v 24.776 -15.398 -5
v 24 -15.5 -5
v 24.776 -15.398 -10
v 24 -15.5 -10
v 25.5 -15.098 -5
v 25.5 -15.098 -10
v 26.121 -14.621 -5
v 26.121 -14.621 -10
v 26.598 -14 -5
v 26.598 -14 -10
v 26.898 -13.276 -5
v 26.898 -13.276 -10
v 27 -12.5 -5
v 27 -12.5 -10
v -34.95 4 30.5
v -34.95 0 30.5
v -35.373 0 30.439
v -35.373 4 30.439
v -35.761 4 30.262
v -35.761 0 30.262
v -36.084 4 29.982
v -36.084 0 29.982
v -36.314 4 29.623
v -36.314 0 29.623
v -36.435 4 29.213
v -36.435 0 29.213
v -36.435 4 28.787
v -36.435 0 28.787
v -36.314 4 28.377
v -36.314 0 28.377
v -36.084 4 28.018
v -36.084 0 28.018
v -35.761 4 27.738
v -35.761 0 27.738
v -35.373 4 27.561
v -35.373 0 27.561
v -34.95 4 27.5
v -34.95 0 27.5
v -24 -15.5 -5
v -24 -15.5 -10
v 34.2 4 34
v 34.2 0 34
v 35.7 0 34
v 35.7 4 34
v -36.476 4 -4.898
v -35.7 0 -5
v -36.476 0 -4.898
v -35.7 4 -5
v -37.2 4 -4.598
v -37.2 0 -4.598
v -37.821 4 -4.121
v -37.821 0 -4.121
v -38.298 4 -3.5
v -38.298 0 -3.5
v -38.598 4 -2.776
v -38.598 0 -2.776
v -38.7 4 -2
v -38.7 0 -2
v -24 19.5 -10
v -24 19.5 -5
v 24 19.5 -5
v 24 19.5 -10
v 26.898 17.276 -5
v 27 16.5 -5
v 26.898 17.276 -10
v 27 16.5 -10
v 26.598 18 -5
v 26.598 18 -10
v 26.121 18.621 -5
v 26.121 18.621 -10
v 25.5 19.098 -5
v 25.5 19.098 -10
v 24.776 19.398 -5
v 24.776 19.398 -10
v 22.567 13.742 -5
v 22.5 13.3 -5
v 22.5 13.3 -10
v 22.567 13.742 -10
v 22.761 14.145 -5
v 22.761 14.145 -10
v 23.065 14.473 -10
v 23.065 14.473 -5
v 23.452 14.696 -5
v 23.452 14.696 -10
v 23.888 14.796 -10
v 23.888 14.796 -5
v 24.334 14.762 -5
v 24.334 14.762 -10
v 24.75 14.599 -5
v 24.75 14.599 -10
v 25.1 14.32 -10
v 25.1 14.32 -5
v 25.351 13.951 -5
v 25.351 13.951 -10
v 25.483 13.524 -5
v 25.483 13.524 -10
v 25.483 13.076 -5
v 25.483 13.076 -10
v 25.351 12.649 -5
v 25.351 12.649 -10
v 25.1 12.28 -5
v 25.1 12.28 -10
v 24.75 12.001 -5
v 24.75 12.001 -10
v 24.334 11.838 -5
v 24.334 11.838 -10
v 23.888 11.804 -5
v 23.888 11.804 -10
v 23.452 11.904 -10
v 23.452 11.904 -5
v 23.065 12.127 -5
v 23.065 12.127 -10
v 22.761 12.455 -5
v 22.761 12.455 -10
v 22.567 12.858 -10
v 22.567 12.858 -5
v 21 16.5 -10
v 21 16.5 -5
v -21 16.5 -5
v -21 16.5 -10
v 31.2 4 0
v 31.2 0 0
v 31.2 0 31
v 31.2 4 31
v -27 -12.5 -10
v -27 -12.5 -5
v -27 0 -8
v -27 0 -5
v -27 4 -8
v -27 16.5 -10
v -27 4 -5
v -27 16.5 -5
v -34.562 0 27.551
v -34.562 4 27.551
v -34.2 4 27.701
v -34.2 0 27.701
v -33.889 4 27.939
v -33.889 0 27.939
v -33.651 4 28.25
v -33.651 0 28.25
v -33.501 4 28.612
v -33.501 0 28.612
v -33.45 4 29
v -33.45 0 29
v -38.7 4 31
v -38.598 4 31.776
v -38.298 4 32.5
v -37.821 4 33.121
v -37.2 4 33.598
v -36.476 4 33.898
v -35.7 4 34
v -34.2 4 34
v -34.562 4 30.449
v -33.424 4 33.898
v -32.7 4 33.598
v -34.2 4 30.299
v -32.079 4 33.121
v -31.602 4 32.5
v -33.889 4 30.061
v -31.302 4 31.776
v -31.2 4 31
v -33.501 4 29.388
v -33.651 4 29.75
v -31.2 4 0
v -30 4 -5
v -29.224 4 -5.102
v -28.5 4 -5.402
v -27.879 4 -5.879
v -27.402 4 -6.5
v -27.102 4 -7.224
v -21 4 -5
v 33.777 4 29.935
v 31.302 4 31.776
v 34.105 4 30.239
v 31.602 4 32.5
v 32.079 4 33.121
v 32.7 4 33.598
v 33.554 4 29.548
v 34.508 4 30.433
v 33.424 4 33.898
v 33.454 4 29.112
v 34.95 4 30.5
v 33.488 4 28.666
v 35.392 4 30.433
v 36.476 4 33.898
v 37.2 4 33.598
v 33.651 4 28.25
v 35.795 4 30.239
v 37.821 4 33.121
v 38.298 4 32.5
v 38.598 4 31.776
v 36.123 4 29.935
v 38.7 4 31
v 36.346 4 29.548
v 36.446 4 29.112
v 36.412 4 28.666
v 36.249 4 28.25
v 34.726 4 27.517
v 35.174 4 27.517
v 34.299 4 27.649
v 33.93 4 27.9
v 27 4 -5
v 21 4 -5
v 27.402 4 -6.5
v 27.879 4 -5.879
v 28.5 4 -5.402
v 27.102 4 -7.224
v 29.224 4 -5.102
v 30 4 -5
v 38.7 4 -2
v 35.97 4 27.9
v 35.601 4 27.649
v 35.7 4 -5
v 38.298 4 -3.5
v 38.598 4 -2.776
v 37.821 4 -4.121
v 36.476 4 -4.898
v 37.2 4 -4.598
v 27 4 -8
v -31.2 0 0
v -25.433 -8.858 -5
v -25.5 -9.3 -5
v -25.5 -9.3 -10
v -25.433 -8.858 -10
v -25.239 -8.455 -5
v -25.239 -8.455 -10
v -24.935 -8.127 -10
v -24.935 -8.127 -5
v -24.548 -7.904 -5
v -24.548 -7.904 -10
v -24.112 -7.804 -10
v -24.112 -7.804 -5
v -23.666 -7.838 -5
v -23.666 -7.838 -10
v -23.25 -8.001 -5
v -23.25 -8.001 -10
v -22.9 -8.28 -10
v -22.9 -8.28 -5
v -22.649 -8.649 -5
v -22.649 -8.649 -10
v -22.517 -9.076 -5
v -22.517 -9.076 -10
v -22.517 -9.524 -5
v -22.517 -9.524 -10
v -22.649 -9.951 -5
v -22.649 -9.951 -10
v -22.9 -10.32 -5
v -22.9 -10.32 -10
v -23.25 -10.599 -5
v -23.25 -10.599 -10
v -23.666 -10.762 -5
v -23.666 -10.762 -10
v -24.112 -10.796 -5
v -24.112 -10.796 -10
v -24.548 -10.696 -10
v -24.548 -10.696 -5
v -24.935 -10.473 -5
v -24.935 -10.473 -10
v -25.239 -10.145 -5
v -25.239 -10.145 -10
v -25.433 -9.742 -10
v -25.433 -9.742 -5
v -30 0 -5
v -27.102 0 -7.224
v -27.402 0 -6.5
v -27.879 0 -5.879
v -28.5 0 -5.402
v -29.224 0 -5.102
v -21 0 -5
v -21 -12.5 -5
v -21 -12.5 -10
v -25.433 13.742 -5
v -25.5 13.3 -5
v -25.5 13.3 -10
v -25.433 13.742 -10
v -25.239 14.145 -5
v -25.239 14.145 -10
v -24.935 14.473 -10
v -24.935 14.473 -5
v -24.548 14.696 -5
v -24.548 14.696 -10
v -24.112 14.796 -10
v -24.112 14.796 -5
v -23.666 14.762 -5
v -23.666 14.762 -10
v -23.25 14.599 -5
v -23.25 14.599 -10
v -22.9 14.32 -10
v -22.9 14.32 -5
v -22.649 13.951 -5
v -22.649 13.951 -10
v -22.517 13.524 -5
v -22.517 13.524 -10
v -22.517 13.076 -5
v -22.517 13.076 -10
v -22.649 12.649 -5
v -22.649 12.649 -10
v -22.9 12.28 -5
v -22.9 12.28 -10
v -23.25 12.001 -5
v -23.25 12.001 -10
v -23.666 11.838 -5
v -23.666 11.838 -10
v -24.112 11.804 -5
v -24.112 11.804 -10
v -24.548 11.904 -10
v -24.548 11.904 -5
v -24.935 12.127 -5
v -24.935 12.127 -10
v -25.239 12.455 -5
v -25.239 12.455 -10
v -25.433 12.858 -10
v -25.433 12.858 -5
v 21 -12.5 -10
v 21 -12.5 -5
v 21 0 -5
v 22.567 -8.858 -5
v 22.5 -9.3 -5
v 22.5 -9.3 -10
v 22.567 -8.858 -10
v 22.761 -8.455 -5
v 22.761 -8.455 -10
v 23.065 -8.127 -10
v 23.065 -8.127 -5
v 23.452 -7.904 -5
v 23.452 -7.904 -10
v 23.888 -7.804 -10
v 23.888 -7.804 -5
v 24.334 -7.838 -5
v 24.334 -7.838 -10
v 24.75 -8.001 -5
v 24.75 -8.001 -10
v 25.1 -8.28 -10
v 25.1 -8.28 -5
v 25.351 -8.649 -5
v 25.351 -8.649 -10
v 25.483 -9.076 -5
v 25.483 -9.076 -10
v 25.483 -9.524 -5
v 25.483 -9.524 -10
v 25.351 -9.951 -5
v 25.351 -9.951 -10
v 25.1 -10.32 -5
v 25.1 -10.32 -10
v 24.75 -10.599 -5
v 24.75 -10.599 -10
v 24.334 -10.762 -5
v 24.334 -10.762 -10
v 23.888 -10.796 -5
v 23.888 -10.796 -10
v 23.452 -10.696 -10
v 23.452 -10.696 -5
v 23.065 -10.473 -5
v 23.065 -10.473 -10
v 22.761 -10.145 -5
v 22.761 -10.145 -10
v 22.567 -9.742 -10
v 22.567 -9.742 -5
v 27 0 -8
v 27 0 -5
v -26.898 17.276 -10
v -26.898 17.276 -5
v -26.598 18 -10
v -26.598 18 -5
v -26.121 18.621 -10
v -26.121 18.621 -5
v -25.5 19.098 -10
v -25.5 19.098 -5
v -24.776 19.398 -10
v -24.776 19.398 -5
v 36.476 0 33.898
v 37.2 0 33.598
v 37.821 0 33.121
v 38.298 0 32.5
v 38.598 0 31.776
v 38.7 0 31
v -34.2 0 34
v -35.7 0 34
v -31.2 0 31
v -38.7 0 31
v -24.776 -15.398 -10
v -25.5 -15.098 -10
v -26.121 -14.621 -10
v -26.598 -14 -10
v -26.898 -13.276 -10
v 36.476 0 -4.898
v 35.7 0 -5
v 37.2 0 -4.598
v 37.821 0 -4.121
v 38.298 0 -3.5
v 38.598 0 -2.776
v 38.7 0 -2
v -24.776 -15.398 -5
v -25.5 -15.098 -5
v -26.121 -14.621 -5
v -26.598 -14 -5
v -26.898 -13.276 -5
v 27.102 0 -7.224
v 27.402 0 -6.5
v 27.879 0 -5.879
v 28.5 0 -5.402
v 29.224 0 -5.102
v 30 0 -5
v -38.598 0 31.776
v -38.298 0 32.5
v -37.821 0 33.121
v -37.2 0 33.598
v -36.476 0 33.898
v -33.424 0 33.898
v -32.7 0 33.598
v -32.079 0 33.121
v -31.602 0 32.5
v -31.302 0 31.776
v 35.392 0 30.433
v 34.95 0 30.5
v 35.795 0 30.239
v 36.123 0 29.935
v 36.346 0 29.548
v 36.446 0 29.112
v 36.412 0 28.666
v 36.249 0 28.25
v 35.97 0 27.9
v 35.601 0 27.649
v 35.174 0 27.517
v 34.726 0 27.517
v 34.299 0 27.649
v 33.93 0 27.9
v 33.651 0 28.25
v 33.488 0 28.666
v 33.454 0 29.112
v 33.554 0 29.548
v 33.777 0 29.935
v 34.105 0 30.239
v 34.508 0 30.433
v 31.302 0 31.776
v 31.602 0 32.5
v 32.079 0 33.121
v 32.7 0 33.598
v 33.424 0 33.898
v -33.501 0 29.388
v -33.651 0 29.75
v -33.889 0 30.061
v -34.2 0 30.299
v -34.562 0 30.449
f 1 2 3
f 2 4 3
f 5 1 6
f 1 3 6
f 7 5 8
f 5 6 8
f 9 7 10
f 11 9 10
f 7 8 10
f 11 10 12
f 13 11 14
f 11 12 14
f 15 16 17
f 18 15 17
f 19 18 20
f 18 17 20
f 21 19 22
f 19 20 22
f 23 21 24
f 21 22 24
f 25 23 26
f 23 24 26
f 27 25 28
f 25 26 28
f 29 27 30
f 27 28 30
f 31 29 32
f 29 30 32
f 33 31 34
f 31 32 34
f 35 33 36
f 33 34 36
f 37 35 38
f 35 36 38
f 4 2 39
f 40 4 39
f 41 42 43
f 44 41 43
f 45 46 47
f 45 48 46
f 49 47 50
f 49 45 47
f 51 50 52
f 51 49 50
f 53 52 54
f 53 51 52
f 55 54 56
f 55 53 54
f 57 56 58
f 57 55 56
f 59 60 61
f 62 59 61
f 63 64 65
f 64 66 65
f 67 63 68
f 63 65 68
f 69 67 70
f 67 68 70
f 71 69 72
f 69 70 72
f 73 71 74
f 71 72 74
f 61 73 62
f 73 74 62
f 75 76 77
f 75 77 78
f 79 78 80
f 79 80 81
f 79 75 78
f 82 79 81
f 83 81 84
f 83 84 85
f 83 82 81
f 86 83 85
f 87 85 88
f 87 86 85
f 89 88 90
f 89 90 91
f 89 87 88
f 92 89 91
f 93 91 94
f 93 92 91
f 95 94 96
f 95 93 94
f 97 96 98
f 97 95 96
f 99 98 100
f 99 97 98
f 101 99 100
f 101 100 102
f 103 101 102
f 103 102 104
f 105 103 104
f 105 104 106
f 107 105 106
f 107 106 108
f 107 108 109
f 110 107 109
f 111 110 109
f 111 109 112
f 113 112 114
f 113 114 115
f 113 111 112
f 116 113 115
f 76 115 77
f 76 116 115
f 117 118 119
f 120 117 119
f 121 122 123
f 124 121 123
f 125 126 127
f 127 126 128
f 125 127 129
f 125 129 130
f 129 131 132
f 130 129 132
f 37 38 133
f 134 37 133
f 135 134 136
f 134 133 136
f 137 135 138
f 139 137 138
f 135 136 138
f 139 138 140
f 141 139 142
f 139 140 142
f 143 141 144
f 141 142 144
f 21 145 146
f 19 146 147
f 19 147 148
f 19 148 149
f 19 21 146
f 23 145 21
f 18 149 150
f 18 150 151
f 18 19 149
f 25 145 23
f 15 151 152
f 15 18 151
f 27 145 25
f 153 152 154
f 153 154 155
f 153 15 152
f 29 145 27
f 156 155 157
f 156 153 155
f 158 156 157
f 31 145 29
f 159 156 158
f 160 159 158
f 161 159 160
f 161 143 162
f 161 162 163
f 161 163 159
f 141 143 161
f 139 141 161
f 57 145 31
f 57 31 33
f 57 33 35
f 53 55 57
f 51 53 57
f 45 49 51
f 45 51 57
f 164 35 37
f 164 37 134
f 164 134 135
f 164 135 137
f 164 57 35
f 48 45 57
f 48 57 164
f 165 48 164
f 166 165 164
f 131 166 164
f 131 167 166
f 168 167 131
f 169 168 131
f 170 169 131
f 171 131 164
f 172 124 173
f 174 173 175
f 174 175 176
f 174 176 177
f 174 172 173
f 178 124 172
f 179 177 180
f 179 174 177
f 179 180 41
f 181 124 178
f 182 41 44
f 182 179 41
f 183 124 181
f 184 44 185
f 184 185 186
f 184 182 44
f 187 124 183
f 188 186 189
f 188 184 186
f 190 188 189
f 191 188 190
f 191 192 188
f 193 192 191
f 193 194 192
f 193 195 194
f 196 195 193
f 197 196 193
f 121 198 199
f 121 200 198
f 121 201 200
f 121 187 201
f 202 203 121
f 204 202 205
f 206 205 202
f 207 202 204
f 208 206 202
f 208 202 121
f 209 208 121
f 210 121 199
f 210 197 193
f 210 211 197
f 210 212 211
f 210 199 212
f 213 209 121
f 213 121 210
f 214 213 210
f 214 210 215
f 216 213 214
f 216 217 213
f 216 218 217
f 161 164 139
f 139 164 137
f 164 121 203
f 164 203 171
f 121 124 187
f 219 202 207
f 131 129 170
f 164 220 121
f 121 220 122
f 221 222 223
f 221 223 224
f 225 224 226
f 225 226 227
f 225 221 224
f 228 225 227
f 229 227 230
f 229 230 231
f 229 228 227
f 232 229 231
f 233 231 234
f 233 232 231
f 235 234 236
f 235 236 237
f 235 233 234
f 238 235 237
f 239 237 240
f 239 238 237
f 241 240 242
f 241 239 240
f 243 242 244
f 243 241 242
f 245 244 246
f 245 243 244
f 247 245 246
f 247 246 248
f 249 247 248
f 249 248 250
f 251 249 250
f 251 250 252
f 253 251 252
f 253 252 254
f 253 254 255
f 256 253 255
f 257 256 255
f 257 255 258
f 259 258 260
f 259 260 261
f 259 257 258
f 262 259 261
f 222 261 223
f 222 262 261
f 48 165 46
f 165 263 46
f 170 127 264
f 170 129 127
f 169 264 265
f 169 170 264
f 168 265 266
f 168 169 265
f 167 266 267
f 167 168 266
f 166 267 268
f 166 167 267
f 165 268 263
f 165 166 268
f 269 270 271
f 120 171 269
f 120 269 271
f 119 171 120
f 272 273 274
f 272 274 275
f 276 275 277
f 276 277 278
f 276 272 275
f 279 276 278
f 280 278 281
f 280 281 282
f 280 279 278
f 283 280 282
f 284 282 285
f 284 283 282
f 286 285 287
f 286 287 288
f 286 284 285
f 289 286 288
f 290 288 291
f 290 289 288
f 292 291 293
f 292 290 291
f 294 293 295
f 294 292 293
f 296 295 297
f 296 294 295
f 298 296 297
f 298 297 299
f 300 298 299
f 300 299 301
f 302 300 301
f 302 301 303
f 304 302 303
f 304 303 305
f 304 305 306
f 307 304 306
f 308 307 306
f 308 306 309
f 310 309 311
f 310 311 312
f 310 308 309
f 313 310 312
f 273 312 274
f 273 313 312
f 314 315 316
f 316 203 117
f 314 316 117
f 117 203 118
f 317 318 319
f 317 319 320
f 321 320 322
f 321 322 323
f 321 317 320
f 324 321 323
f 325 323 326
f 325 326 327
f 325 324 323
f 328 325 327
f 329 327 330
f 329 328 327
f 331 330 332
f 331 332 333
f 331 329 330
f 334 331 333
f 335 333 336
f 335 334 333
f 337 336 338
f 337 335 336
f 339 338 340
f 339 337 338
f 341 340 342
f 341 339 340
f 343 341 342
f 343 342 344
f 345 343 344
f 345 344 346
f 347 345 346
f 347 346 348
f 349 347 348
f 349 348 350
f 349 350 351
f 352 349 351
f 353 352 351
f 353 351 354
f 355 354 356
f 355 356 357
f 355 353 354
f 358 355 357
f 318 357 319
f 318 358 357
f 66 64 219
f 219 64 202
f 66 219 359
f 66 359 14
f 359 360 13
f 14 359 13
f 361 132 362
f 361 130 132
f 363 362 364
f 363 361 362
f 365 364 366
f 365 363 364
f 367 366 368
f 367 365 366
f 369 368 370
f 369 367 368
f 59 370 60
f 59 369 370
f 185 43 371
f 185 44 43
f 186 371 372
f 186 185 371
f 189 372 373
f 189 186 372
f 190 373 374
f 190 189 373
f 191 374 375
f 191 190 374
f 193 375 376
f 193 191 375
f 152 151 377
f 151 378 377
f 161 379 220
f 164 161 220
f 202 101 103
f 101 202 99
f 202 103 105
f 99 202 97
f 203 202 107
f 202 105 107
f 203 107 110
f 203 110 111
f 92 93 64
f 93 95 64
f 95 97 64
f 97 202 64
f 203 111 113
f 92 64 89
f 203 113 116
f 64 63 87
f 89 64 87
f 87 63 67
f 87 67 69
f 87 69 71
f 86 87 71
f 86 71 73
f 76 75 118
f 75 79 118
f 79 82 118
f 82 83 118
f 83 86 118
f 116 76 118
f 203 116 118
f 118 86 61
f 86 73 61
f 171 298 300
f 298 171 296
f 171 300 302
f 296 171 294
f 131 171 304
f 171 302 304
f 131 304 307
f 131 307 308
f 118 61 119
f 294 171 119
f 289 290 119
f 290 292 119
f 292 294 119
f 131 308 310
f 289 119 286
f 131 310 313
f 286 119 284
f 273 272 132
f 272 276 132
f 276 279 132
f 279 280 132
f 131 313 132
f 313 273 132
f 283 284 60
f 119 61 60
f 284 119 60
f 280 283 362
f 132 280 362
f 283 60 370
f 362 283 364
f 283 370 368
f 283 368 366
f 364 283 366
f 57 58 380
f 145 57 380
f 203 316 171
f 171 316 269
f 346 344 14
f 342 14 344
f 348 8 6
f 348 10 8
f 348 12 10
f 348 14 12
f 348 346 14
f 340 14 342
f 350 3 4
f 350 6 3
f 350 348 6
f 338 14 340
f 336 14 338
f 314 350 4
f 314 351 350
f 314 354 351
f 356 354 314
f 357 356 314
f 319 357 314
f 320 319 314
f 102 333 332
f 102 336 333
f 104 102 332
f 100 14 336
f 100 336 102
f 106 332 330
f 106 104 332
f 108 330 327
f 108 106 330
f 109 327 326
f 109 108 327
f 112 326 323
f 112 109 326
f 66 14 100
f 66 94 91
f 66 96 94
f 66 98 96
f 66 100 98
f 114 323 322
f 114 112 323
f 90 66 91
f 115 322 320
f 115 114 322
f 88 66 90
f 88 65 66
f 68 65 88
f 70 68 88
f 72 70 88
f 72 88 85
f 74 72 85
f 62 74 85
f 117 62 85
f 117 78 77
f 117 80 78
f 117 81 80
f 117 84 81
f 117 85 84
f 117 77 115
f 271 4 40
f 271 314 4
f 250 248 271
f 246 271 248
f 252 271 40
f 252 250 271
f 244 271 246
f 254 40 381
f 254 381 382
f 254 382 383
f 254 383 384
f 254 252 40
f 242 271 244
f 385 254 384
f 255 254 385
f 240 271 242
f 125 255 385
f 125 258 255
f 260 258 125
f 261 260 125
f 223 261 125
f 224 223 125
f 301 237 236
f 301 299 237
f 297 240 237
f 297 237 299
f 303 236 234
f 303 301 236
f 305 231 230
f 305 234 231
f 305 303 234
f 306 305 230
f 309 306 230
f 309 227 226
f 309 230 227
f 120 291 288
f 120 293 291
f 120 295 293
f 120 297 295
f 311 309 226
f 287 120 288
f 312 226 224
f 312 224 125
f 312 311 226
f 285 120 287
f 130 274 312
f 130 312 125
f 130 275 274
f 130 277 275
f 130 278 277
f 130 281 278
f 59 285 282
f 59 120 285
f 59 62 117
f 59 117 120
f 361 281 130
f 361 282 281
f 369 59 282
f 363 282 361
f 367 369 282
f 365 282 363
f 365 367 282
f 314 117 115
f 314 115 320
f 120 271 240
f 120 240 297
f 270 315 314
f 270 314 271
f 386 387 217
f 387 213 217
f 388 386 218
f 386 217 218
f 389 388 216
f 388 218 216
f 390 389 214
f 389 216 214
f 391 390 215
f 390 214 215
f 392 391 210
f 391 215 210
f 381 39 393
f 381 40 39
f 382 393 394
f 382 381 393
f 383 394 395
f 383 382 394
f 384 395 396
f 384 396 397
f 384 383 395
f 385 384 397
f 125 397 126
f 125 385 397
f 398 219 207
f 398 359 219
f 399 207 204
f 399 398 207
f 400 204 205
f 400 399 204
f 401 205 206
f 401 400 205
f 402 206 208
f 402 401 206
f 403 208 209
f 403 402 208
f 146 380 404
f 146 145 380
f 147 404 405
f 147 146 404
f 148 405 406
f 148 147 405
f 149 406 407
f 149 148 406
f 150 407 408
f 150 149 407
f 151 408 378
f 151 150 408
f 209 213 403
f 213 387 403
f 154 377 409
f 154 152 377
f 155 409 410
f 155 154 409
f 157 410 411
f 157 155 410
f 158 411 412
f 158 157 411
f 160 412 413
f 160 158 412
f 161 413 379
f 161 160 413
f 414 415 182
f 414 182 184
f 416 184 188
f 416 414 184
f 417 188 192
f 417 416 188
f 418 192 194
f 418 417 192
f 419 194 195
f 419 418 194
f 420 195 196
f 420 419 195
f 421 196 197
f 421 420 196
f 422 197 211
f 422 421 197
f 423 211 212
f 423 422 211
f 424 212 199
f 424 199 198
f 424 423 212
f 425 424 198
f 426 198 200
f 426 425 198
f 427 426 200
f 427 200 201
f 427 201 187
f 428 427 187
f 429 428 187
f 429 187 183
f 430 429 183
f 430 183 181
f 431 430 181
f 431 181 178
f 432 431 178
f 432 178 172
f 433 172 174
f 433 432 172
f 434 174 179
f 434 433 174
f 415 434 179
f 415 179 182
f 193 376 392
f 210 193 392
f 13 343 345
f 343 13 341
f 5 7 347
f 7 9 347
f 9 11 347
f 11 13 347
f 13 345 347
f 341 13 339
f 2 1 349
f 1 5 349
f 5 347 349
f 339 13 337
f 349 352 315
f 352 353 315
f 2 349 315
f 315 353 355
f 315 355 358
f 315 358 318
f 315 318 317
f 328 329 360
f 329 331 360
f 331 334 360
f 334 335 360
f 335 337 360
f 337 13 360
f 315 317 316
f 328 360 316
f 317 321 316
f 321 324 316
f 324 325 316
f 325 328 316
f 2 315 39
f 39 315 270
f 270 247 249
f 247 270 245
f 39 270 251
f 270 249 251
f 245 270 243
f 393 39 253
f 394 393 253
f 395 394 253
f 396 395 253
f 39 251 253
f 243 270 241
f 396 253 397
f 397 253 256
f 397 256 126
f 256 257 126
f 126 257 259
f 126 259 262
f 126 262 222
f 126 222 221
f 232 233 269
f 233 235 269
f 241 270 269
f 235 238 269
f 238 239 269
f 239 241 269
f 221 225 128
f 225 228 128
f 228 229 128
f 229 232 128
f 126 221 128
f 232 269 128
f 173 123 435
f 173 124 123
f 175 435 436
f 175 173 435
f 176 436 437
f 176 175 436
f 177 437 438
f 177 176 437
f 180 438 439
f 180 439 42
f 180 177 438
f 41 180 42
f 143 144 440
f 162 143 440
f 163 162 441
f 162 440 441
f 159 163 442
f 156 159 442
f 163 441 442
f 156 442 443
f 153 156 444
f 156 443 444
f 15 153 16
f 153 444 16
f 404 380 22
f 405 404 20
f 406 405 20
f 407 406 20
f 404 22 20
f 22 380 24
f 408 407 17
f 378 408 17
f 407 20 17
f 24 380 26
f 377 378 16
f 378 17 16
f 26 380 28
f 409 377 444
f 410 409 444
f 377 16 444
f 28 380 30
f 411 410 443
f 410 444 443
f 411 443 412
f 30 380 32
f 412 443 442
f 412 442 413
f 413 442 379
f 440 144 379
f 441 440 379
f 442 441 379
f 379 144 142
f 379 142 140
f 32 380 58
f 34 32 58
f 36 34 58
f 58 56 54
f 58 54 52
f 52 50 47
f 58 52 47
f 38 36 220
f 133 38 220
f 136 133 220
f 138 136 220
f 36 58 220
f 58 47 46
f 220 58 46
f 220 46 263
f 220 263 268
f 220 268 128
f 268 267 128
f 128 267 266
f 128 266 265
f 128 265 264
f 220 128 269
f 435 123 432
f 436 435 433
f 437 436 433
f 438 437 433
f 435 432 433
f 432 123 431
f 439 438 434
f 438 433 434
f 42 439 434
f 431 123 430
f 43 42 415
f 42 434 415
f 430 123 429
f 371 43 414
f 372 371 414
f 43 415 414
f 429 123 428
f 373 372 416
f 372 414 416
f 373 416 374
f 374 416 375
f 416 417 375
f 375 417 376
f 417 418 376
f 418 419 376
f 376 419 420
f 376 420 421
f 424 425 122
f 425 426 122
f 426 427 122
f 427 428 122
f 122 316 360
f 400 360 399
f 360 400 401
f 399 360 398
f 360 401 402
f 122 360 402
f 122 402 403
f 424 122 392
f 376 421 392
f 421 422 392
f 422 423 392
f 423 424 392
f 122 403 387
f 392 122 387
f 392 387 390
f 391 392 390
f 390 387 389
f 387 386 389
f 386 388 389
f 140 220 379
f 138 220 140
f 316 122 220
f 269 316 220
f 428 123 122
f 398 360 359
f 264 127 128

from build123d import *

# Parameters (mm, degrees)
SKETCH_1_R      = 1.5
EXTRUDE_1_DEPTH = 4
SKETCH_3_R      = 1.5
SKETCH_3_W      = 42
SKETCH_3_H      = 29
EXTRUDE_2_DEPTH = 5
FILLET_1_R      = 3
FILLET_2_R      = 3


with BuildPart() as part:
    # 草图1 → 凸台-拉伸1 (new body)
    # profile 1 of 3: a face of its own
    with BuildSketch(Plane(origin=(0, 0, 0), x_dir=(1, 0, 0), z_dir=(0, 1, 0))):
        Polygon((0, 0), (31.2, 0), (31.2, -34), (38.7, -34), (38.7, 5), (0, 5), align=None)
        with Locations(Location((34.95, -29, 0), (0, 0, 270))):
            Circle(SKETCH_1_R, mode=Mode.SUBTRACT)
    # profile 2 of 3: a face of its own
    with BuildSketch(Plane(origin=(0, 0, 0), x_dir=(1, 0, 0), z_dir=(0, 1, 0))):
        with BuildLine():
            Line((-31.2, 0), (0, 0))
            Line((0, 0), (0, 5))
            Line((0, 5), (-34.95, 5))
            Line((-34.95, 5), (-34.95, -27.5))
            ThreePointArc((-34.95, -27.5), (-33.889339828, -27.939339828), (-33.45, -29))
            ThreePointArc((-33.45, -29), (-33.889339828, -30.060660172), (-34.95, -30.5))
            Line((-34.95, -30.5), (-34.95, -34))
            Line((-34.95, -34), (-31.2, -34))
            Line((-31.2, -34), (-31.2, 0))
        make_face()
    # profile 3 of 3: a face of its own
    with BuildSketch(Plane(origin=(0, 0, 0), x_dir=(1, 0, 0), z_dir=(0, 1, 0))):
        with BuildLine():
            Line((-34.95, -27.5), (-34.95, 5))
            Line((-34.95, 5), (-38.7, 5))
            Line((-38.7, 5), (-38.7, -34))
            Line((-38.7, -34), (-34.95, -34))
            Line((-34.95, -34), (-34.95, -30.5))
            ThreePointArc((-34.95, -30.5), (-36.45, -29), (-34.95, -27.5))
        make_face()
    extrude(amount=EXTRUDE_1_DEPTH)

    # 草图3 → 凸台-拉伸2 (add)
    with BuildSketch(Plane(origin=(0, 0, -5), x_dir=(-1, 0, 0), z_dir=(0, 0, -1))):
        Polygon((-27, 2), (-27, -12.5), (-27, -15.5), (27, -15.5), (27, -12.5), (27, 2), (27, 16.5), (27, 19.5), (-27, 19.5), (-27, 16.5), align=None)
        with Locations((-24, 13.3)):
            Circle(SKETCH_3_R, mode=Mode.SUBTRACT)
        with Locations((24, 13.3)):
            Circle(SKETCH_3_R, mode=Mode.SUBTRACT)
        with Locations((24, -9.3)):
            Circle(SKETCH_3_R, mode=Mode.SUBTRACT)
        with Locations((-24, -9.3)):
            Circle(SKETCH_3_R, mode=Mode.SUBTRACT)
        with Locations((0, 2)):
            Rectangle(SKETCH_3_W, SKETCH_3_H, mode=Mode.SUBTRACT)
    extrude(amount=EXTRUDE_2_DEPTH)

    # 圆角1
    fillet_1_edges = [part.edges().sort_by_distance(p)[0] for p in [
        (27, -15.5, -7.5),
        (27, 19.5, -7.5),
        (-27, -15.5, -7.5),
        (-38.7, 2, -5),
        (-27, 19.5, -7.5),
        (-27, 2, -5),
        (38.7, 2, -5),
        (27, 2, -5),
    ]]
    fillet(fillet_1_edges, radius=FILLET_1_R)

    # 圆角2
    fillet_2_edges = [part.edges().sort_by_distance(p)[0] for p in [
        (38.7, 2, 34),
        (31.2, 2, 34),
        (-31.2, 2, 34),
        (-38.7, 2, 34),
    ]]
    fillet(fillet_2_edges, radius=FILLET_2_R)


solid = part.part
